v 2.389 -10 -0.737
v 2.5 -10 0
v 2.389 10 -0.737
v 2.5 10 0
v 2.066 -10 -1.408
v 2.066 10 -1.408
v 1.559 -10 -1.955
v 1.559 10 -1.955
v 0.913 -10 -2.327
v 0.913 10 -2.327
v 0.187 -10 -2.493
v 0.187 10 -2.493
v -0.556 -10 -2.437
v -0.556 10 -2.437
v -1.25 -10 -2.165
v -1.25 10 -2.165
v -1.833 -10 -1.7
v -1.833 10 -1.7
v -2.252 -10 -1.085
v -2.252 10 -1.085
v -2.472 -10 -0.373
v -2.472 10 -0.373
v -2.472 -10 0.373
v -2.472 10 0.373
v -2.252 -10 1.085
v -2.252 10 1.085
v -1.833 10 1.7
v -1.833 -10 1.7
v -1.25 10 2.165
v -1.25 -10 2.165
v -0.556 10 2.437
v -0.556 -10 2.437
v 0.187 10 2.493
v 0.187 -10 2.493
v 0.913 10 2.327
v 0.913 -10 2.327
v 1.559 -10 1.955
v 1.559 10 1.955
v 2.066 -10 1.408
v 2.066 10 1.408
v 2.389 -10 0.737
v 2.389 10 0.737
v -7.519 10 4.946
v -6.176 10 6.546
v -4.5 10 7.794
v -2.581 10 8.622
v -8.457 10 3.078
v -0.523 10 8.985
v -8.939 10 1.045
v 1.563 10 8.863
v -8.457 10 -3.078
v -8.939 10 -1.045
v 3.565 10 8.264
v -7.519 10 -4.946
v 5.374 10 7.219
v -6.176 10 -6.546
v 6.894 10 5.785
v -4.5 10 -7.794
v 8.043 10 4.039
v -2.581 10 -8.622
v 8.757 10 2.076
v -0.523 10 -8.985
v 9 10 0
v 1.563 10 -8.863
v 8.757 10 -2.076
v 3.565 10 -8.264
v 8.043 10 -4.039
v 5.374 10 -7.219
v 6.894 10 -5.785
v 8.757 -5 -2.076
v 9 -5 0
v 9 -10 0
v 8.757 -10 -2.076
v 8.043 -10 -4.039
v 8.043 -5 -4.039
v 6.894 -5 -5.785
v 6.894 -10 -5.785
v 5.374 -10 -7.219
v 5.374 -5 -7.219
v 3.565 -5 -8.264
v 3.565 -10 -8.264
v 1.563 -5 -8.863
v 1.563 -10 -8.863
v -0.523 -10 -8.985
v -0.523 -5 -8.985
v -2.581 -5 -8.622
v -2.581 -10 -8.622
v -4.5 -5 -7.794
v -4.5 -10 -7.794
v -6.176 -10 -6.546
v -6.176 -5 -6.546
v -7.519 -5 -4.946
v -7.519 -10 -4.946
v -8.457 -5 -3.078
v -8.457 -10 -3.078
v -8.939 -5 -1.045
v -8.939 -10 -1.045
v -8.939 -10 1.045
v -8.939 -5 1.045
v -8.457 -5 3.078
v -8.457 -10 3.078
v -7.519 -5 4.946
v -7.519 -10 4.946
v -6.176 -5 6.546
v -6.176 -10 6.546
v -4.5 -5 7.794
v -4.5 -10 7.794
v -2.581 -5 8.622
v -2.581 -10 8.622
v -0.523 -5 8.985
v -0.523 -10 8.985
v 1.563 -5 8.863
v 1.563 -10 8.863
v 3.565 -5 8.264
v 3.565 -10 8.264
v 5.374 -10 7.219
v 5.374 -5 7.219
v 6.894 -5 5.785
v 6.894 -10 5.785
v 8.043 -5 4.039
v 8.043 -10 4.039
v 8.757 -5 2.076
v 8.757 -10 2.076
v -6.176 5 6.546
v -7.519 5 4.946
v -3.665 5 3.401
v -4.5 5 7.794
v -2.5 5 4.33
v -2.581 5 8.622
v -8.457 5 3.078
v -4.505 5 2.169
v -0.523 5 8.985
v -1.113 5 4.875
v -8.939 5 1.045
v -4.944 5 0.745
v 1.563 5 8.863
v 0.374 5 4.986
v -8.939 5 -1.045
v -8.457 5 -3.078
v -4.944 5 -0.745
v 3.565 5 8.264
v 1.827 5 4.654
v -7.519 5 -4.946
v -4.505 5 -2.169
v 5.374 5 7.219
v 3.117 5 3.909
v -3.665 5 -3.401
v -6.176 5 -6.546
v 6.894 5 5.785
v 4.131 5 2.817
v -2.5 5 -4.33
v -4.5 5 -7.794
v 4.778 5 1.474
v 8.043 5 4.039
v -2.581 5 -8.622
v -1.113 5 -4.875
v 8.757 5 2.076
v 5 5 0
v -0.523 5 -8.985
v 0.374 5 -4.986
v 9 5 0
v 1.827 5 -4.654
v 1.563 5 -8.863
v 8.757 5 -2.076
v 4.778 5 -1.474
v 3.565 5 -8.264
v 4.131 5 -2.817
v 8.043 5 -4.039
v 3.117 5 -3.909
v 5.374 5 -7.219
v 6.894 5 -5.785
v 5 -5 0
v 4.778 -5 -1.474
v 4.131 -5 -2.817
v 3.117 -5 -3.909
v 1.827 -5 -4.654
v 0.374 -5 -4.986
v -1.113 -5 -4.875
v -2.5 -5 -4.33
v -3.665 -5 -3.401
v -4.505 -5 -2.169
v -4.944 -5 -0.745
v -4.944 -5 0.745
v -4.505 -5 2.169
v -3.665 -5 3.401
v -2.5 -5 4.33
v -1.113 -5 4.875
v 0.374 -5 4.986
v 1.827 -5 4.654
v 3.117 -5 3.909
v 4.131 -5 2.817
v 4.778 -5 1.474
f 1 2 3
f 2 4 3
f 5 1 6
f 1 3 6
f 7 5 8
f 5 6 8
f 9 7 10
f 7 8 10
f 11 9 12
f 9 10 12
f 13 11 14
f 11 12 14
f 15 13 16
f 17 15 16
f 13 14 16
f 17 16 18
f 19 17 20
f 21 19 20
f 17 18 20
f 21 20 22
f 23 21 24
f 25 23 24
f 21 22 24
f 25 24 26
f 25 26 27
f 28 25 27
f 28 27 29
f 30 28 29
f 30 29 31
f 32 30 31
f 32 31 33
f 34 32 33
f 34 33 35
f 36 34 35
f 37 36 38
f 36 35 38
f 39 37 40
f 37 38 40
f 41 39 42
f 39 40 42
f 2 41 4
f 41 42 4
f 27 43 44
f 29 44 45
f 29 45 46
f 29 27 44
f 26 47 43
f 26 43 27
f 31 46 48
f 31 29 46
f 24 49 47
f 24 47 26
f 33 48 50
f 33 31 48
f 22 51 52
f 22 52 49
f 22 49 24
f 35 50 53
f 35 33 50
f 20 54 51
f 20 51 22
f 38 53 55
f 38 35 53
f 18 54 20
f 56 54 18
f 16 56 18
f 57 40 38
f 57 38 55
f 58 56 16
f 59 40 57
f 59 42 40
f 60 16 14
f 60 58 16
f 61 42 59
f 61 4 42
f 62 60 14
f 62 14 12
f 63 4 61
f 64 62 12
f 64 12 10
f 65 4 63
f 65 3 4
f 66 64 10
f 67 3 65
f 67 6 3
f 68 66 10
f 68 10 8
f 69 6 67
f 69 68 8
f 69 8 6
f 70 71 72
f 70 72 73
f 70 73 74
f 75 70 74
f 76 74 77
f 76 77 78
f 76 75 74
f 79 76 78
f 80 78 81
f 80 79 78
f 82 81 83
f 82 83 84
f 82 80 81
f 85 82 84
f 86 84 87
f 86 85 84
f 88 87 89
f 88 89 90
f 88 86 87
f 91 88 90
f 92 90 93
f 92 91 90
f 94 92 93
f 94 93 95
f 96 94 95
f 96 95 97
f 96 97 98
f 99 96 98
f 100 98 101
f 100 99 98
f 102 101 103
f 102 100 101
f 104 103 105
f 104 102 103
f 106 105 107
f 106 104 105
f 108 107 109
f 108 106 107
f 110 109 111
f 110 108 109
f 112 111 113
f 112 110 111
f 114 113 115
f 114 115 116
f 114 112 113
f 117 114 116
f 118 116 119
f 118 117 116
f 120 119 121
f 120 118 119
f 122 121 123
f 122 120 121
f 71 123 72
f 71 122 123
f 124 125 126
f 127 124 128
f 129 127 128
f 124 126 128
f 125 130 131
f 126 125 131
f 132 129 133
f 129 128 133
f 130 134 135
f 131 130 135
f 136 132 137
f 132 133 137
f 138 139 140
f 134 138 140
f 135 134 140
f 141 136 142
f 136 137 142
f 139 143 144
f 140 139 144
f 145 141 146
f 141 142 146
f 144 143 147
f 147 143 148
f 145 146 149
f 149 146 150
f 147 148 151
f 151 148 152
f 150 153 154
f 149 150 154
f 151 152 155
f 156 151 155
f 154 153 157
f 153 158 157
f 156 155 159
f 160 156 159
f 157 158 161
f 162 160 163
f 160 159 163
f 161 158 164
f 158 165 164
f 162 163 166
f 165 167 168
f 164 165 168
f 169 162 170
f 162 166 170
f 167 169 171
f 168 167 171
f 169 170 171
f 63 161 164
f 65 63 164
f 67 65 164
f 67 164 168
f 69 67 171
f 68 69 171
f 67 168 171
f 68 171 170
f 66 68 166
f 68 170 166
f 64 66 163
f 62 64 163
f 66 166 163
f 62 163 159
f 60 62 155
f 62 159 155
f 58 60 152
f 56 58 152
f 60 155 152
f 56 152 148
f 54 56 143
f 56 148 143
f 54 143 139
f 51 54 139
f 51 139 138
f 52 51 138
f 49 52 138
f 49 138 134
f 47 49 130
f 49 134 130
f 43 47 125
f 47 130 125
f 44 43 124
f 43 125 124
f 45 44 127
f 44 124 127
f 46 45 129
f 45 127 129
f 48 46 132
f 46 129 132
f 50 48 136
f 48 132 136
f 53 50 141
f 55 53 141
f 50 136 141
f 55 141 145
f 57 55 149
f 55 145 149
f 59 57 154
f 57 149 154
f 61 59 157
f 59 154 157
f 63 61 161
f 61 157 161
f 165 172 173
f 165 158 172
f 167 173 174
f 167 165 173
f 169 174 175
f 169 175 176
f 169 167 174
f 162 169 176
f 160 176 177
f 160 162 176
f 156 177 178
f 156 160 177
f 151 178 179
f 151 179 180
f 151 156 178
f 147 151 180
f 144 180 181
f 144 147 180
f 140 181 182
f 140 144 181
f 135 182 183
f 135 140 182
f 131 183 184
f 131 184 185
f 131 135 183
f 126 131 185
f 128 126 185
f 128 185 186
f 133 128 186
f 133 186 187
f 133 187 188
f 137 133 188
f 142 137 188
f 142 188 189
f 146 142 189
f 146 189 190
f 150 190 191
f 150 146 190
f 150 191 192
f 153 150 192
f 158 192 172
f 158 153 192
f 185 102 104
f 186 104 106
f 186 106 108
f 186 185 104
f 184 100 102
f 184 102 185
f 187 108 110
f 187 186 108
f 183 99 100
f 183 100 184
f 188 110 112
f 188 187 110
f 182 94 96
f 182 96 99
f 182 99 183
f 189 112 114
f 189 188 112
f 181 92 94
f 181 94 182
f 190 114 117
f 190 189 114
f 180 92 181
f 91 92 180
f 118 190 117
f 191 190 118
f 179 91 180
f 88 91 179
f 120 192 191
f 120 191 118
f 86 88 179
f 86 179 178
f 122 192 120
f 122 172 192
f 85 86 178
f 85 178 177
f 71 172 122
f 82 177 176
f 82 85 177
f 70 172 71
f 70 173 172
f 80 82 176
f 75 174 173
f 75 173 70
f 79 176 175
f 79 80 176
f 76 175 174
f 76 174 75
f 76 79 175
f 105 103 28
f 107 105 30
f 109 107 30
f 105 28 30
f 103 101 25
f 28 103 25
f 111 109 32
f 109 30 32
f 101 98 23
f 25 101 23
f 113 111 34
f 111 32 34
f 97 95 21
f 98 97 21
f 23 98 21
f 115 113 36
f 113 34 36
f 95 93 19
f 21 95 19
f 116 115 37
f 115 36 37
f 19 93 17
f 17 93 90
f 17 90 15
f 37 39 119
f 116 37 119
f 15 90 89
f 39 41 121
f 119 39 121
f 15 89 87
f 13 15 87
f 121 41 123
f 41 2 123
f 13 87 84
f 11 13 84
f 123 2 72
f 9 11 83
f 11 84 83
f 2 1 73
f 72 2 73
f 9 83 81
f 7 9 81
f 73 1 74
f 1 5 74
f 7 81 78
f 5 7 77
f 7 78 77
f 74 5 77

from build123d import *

# Parameters (mm, degrees)
SKETCH1_R               = 5
BOSS_EXTRUDE1_DEPTH     = 5
SKETCH3_R               = 9
BOSS_EXTRUDE2_DEPTH     = 5
SKETCH2_R               = 2.5
CUT_EXTRUDE1_DEPTH      = 7
CUT_EXTRUDE1_DEPTH_BACK = 15


with BuildPart() as part:
    # Sketch1 → Boss-Extrude1 (new body)
    with BuildSketch(Plane(origin=(0, 0, 0), x_dir=(1, 0, 0), z_dir=(0, 1, 0))):
        Circle(SKETCH1_R)
    boss_extrude1 = extrude(amount=BOSS_EXTRUDE1_DEPTH)

    # Sketch3 → Boss-Extrude2 (add)
    with BuildSketch(Plane(origin=(0, 5, 0), x_dir=(1, 0, 0), z_dir=(0, 1, 0))):
        Circle(SKETCH3_R)
    boss_extrude2 = extrude(amount=BOSS_EXTRUDE2_DEPTH)

    # Mirror1: Boss-Extrude1, Boss-Extrude2 across plane
    add(boss_extrude1.mirror(Plane.ZX))
    add(boss_extrude2.mirror(Plane.ZX))

    # Sketch2 → Cut-Extrude1 (cut, two sides)
    with BuildSketch(Plane(origin=(0, 4, 0), x_dir=(1, 0, 0), z_dir=(0, 1, 0))) as cut_extrude1_sk:
        Circle(SKETCH2_R)
    extrude(amount=CUT_EXTRUDE1_DEPTH, mode=Mode.SUBTRACT)
    extrude(cut_extrude1_sk.sketch, amount=-CUT_EXTRUDE1_DEPTH_BACK, mode=Mode.SUBTRACT)


solid = part.part
